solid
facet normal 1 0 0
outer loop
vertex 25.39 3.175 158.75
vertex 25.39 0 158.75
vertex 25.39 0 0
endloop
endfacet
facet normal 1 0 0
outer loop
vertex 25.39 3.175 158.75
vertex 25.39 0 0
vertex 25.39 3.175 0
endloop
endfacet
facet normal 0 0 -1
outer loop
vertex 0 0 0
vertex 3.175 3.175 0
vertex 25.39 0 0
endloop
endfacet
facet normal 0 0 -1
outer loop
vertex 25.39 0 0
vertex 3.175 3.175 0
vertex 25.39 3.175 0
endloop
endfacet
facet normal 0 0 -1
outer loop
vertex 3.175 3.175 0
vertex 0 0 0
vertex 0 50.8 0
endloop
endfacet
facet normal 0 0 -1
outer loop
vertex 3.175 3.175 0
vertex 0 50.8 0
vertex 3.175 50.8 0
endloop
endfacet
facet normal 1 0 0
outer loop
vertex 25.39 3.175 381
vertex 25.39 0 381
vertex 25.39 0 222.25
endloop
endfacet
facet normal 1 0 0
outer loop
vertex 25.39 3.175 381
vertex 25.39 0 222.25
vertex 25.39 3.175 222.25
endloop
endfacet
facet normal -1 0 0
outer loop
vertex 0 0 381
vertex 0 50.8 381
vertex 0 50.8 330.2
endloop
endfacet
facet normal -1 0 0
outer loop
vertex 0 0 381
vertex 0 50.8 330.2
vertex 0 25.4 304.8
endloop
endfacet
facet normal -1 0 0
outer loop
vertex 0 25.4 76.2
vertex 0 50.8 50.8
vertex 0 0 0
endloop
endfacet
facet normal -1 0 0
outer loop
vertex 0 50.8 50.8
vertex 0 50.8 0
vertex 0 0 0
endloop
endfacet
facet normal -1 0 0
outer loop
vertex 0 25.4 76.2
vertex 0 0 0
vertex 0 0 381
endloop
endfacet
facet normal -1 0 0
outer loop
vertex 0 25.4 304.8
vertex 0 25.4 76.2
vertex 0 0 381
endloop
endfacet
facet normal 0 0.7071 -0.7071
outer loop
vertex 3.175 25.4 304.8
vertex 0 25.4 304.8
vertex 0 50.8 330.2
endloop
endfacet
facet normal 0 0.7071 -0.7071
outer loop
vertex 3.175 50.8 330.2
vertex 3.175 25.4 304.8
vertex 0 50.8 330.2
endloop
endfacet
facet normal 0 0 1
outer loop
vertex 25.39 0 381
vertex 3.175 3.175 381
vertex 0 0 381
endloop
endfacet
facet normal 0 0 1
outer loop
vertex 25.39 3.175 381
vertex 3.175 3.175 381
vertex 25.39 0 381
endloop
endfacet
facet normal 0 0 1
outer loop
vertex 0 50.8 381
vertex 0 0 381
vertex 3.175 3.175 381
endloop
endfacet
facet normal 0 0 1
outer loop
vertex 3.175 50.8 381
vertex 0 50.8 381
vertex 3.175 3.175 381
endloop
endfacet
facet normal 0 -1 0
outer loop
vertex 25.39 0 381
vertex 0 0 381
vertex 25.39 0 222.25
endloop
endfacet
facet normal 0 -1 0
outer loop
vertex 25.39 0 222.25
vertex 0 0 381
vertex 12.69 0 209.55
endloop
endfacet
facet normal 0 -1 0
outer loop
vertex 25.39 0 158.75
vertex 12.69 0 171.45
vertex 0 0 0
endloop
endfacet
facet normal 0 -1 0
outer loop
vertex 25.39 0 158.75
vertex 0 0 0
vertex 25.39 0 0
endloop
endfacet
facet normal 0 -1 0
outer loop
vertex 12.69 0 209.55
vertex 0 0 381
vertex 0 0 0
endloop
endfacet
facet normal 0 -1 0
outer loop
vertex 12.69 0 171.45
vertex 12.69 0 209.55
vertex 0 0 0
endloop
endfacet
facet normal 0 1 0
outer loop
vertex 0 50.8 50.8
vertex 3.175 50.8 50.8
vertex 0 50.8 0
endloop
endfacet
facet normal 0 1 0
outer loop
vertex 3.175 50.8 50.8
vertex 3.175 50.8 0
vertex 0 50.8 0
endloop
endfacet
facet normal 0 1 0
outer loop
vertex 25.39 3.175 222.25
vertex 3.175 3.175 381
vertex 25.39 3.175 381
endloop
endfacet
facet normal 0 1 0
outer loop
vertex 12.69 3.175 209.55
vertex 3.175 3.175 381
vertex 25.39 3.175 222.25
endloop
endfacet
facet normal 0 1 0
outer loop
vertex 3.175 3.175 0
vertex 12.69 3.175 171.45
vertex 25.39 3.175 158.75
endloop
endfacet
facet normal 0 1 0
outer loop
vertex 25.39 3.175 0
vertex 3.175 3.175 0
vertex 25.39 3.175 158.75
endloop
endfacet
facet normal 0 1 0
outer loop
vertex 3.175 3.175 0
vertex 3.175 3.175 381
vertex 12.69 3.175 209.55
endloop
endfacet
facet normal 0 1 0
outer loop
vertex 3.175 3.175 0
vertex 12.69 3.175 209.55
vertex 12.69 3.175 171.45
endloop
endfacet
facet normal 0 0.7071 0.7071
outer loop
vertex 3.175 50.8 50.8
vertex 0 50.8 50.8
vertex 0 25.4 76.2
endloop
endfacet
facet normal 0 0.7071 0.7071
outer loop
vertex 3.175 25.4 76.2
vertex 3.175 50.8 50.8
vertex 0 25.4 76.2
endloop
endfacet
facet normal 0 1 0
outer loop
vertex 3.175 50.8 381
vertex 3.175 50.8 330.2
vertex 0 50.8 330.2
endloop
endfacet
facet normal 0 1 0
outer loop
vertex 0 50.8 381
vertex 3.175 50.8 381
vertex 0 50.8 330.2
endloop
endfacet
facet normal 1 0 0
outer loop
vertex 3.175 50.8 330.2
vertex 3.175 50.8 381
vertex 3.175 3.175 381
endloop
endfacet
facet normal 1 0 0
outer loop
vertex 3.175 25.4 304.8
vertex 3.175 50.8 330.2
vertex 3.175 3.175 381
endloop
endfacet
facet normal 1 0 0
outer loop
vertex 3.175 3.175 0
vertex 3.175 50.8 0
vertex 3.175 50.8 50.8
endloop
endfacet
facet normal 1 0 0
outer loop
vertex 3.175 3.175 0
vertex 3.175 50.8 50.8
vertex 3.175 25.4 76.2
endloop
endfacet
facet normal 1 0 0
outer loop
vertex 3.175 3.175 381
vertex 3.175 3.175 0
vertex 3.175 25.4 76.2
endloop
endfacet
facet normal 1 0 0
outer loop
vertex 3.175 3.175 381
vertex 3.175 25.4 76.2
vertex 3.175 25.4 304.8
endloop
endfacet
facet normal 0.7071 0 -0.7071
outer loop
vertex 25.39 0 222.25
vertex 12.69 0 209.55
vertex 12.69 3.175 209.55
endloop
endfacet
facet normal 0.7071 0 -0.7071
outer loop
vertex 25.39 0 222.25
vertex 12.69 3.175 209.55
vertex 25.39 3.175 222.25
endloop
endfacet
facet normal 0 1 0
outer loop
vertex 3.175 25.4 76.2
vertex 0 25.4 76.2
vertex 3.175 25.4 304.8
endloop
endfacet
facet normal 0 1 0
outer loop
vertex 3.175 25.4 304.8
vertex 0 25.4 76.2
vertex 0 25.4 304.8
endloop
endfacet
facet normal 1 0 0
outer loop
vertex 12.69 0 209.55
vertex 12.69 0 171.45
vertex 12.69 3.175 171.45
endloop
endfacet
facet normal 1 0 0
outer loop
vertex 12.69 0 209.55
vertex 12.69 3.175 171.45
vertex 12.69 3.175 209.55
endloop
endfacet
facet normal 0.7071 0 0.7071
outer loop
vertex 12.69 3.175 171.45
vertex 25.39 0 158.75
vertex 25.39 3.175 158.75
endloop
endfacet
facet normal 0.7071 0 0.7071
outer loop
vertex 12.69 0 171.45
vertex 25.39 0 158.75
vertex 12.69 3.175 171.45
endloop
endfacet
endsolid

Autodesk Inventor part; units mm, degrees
ref_plane "YZ Plane" through (0, 0, 0) normal (1, 0, 0) x (0, 1, 0)
ref_plane "XZ Plane" through (0, 0, 0) normal (0, 1, 0) x (-1, 0, 0)
ref_plane "XY Plane" through (0, 0, 0) normal (0, 0, 1) x (1, 0, 0)
sketch "Sketch1" plane through (0, 0, 0) normal (0, 0, 1) x (1, 0, 0)
  line L0 (0, 0) -> (25.3902, 0)
  line L1 (25.3902, 0) -> (25.3902, 3.175)
  line L2 (3.175, 50.8) -> (0, 50.8)
  line L3 (0, 50.8) -> (0, 0)
  line L4 (3.175, 50.8) -> (3.175, 3.175)
  line L5 (3.175, 3.175) -> (25.3902, 3.175)
  dimension "d0" = 50.8
  dimension "d1" = 25.3902
  dimension "d2" = 3.175
  dimension "d3" = 3.175
extrude "Extrusion1" add sketch "Sketch1" along normal blind 381
sketch "Sketch2" plane through (0, 0, 0) normal (0, -1, 0) x (1, 0, 0)
  line L0 (0, 0) -> (25.3902, 0) projected
  line L1 (25.3902, 0) -> (25.3902, 381) projected
  line L2 (25.3902, 158.75) -> (12.6902, 171.45)
  line L3 (12.6902, 171.45) -> (12.6902, 209.55)
  line L4 (12.6902, 209.55) -> (25.3902, 222.25)
  dimension "d6" = 12.7
  dimension "d7" = 45
  dimension "d8" = 45
  dimension "d9" = 38.1
  dimension "d10" = 171.45
extrude "Extrusion2" cut sketch "Sketch2" against normal through all
sketch "Sketch3" plane through (0, 0, 0) normal (-1, 0, 0) x (0, 0, 1)
  line L0 (381, 0) -> (381, 50.8) projected
  line L1 (0, 50.8) -> (381, 50.8) projected
  line L2 (0, 50.8) -> (0, 0) projected
  line L3 (0, 0) -> (381, 0) projected
  line L4 (50.8, 50.8) -> (76.2, 25.4)
  line L5 (76.2, 25.4) -> (304.8, 25.4)
  line L6 (304.8, 25.4) -> (330.2, 50.8)
  dimension "d13" = 25.4
  dimension "d14" = 45
  dimension "d15" = 45
  dimension "d16" = 50.8
  dimension "d17" = 50.8
extrude "Extrusion3" cut sketch "Sketch3" against normal through all contours L6 L5 L4 L1
equation "\"d2\" = d3"
equation "\"d7\" = d8"
equation "\"d15\" = d14"
equation "\"d17\" = d16"
properties part number "8 ball  frame bottom L"
